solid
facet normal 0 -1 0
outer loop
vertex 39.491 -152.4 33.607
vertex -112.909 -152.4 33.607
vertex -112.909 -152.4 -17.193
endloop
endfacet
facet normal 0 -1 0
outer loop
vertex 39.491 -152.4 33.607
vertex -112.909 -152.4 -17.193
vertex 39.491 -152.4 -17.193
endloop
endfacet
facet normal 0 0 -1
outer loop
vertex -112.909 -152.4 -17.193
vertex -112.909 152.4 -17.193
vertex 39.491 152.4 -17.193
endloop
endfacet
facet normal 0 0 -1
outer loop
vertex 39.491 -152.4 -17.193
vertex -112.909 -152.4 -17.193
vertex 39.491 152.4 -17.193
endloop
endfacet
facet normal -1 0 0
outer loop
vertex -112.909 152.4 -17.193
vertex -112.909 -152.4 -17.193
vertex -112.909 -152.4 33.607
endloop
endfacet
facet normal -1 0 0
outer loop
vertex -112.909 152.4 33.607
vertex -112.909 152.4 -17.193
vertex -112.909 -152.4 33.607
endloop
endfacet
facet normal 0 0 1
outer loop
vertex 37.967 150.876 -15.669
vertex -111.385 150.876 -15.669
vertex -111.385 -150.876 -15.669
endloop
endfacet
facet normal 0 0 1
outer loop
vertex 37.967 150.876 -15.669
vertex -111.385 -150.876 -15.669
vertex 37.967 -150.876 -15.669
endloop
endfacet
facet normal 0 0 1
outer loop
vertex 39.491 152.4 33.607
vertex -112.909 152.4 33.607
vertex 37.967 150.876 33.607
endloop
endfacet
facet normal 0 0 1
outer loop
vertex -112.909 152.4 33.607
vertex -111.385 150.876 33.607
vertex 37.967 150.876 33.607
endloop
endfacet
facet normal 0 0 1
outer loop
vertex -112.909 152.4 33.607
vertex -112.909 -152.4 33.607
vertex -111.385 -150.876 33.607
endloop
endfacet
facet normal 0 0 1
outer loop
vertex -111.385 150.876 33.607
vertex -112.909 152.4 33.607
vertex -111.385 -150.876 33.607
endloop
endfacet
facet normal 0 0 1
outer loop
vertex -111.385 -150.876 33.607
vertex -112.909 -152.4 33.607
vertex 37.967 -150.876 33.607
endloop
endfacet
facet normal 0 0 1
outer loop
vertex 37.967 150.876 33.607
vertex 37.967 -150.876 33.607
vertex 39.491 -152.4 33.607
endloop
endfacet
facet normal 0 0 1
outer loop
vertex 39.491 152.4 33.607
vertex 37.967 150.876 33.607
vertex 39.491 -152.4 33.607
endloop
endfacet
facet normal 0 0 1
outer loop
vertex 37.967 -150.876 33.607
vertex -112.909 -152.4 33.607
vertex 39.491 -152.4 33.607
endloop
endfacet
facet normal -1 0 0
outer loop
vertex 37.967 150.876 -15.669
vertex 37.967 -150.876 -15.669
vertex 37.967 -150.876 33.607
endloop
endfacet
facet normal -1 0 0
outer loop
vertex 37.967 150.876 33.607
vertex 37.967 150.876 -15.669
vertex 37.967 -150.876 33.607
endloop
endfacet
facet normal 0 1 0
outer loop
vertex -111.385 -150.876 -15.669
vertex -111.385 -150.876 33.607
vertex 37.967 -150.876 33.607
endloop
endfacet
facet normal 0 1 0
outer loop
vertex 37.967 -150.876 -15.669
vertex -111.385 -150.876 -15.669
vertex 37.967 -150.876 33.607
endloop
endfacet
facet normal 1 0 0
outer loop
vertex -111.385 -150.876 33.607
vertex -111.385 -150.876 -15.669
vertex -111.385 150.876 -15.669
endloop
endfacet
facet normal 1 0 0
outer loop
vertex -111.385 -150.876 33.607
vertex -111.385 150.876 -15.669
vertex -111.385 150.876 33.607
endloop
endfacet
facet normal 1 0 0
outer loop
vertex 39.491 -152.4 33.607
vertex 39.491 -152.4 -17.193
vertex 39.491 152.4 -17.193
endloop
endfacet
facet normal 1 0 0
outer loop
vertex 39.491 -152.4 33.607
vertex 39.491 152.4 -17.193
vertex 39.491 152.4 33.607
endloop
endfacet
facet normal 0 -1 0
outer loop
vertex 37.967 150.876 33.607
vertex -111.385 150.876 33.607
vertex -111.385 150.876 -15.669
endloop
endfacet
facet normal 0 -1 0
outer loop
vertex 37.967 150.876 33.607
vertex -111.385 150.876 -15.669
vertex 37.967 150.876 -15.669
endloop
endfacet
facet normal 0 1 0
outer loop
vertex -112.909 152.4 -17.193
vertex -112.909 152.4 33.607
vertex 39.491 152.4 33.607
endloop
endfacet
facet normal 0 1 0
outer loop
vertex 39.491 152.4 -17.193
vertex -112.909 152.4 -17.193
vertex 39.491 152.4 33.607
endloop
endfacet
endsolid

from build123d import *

# Parameters (mm, degrees)
F0_W     = 152.4
F0_H     = 50.8
F1_DEPTH = 152.4
F2_T     = -1.524


with BuildPart() as f1:
    # F0 (on Front) → F1 (new body, symmetric)
    with BuildSketch(Plane.XZ):
        with Locations((-36.709375, 8.207178)):
            Rectangle(F0_W, F0_H)
    extrude(amount=F1_DEPTH, both=True)

    # F2
    f2_openings = [f1.faces().sort_by_distance(p)[0] for p in [
        (-36.709375, 0, 33.607178),
    ]]
    offset(amount=F2_T, openings=f2_openings)


solid = f1.part
